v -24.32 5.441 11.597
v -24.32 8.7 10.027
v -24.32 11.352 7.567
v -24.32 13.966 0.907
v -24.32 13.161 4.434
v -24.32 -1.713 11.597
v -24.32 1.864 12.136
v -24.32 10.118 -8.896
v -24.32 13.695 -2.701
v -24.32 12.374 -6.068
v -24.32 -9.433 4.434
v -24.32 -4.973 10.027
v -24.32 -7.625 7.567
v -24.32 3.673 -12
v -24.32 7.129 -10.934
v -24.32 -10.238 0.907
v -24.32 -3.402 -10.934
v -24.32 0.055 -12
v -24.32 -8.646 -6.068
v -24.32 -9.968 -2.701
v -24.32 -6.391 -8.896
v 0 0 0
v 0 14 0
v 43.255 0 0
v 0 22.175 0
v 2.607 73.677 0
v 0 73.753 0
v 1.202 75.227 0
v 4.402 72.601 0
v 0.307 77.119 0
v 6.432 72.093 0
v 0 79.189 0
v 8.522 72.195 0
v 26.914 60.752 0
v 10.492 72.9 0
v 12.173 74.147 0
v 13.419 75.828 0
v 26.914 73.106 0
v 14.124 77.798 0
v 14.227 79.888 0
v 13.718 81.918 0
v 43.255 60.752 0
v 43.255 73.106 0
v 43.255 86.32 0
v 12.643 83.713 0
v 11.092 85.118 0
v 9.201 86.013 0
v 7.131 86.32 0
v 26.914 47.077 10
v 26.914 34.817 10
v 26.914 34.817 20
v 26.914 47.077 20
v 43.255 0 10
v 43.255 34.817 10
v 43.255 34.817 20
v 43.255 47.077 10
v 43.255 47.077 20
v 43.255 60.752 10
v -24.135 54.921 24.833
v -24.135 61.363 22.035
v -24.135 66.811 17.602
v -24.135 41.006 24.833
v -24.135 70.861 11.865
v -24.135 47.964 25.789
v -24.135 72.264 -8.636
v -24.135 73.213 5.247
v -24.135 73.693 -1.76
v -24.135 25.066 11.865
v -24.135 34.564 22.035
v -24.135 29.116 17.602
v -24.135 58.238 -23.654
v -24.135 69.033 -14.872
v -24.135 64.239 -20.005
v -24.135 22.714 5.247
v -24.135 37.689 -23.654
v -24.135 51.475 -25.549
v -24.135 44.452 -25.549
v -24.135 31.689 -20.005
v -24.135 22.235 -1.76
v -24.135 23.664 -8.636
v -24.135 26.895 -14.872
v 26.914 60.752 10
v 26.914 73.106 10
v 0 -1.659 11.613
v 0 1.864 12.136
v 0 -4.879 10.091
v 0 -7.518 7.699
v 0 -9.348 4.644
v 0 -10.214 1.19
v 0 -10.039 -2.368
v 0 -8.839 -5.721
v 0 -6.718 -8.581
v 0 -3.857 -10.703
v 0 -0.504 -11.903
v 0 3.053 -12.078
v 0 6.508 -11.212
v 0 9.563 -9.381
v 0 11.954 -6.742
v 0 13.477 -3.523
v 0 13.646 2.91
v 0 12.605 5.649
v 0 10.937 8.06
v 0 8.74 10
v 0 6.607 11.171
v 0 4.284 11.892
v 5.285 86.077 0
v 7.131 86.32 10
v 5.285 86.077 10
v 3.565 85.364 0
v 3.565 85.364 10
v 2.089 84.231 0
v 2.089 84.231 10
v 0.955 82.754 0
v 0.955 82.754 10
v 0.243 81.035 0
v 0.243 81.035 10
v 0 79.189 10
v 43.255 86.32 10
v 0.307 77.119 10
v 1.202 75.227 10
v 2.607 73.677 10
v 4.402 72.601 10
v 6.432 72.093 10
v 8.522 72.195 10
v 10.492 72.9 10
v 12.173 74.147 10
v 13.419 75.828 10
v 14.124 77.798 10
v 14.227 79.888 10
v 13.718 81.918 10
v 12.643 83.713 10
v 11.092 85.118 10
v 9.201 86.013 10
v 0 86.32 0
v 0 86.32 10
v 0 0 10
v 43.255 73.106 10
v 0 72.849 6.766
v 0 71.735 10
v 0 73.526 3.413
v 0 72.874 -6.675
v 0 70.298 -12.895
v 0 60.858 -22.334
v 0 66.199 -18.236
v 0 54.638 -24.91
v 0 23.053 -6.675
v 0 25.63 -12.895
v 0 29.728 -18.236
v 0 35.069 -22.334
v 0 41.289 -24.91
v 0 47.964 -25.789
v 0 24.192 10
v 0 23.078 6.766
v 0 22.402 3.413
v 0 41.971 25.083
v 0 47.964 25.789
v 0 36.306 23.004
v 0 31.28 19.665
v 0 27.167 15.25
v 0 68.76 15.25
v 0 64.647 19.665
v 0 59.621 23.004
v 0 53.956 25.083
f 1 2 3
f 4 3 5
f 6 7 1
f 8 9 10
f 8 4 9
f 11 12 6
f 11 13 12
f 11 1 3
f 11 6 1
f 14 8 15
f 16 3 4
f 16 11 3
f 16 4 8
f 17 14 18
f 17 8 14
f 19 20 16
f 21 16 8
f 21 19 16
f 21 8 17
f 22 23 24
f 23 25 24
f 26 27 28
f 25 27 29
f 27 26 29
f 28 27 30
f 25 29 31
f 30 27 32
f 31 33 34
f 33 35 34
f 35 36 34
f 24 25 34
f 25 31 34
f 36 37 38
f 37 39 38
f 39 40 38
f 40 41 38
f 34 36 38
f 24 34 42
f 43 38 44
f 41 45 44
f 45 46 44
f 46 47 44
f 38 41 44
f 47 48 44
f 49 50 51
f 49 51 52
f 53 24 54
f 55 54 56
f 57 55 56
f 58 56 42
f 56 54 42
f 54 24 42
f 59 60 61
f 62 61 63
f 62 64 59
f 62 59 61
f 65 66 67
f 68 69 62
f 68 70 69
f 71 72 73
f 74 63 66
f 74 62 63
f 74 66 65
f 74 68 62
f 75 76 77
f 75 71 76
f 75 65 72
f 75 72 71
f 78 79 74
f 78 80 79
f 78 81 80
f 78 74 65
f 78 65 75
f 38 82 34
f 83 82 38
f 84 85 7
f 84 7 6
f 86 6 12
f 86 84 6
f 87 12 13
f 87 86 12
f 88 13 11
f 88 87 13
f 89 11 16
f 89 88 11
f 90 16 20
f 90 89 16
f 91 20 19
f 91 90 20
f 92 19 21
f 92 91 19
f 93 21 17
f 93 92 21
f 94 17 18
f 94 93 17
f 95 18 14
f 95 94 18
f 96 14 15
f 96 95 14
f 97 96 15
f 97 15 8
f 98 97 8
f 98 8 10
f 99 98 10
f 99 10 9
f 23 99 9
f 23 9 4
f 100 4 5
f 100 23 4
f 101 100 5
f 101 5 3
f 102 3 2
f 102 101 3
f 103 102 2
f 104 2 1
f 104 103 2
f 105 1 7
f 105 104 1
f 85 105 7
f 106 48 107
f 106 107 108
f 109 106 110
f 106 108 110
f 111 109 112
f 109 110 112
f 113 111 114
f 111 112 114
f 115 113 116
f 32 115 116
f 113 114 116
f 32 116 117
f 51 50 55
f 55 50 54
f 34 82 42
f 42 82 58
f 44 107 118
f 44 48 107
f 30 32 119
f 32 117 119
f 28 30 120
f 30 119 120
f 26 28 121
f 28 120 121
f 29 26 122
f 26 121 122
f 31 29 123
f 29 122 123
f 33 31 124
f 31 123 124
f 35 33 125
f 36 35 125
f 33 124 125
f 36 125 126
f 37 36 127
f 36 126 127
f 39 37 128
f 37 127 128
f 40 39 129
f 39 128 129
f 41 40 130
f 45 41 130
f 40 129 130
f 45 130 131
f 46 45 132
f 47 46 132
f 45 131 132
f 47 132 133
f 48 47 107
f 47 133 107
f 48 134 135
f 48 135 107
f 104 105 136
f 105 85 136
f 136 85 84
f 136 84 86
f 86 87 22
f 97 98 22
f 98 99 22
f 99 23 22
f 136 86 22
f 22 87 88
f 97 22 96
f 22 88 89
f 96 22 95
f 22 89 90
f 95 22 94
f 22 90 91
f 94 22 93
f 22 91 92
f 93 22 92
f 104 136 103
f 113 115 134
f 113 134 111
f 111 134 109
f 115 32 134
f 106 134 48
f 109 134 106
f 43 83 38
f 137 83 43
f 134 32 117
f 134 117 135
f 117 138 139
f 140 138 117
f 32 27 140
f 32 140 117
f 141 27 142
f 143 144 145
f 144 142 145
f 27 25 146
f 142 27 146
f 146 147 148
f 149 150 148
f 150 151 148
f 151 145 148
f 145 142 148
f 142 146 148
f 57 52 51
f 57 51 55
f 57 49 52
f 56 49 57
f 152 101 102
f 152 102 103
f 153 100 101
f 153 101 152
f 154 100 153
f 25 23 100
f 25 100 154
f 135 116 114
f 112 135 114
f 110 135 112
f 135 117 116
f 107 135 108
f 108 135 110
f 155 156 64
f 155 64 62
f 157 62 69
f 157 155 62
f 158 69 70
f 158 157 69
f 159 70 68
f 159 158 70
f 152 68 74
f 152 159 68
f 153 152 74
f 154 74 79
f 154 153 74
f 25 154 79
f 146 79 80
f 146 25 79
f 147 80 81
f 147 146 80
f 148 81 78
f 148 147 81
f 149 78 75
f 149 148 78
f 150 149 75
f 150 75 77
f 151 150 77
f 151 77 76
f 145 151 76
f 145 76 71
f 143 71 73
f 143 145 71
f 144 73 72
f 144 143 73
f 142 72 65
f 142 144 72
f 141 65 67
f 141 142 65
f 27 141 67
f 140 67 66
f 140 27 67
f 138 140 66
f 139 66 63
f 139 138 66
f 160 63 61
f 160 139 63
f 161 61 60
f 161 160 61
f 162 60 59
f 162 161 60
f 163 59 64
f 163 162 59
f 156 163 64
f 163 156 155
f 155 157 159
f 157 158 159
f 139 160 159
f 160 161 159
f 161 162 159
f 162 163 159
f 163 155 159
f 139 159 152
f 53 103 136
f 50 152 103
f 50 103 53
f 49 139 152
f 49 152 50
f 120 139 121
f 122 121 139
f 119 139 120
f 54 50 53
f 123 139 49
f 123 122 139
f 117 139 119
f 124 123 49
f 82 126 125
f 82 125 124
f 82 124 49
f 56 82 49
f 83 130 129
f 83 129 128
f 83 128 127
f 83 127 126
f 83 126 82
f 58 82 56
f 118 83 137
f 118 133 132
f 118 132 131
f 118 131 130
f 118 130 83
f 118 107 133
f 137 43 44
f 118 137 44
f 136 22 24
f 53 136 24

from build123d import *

# Parameters (mm, degrees)
SKETCH_1_W          = 43.254699728
SKETCH_1_H          = 86.319685861
EXTRUDE_1_DEPTH     = 10
SKETCH_2_W          = 24.135491712
SKETCH_2_H          = 25.789004645
SKETCH_3_W          = 24.320068761
SKETCH_3_H          = 12.136002186
SKETCH_4_W          = 16.340574455
SKETCH_4_H          = 12.354227472
CUT_EXTRUDE_1_DEPTH = 10
SKETCH_4_3_W        = 16.340574455
SKETCH_4_3_H        = 12.259920393
EXTRUDE_2_DEPTH     = 10
SKETCH_8_R          = 7.130638078
CUT_EXTRUDE_3_DEPTH = 10


with BuildPart() as part:
    # 草图1 → 凸台-拉伸1 (new body)
    with BuildSketch(Plane.XY):
        with Locations((21.627349864, 43.159842931)):
            Rectangle(SKETCH_1_W, SKETCH_1_H)
    extrude(amount=EXTRUDE_1_DEPTH)

    # 草图2 → 旋转3 (revolve)
    with BuildSketch(Plane.XY):
        with Locations((-12.067745856, 60.858179452)):
            Rectangle(SKETCH_2_W, SKETCH_2_H)
    revolve(axis=Axis((-24.135491712, 47.963677129, 0), (1, 0, 0)))

    # 草图3 → 旋转5 (revolve)
    with BuildSketch(Plane.XY):
        with Locations((-12.160034381, 7.931725474)):
            Rectangle(SKETCH_3_W, SKETCH_3_H)
    revolve(axis=Axis((-24.320068761, 1.863724381, 0), (1, 0, 0)))

    # 草图4 → 切除-拉伸1 (cut)
    with BuildSketch(Plane.XY.offset(10)):
        with Locations((35.084412501, 66.928824031)):
            Rectangle(SKETCH_4_W, SKETCH_4_H)
    extrude(amount=-CUT_EXTRUDE_1_DEPTH, mode=Mode.SUBTRACT)

    # 草图4<3> → 凸台-拉伸2 (add)
    with BuildSketch(Plane.XY.offset(10)):
        with Locations((35.084412501, 40.947223507)):
            Rectangle(SKETCH_4_3_W, SKETCH_4_3_H)
    extrude(amount=EXTRUDE_2_DEPTH)

    # 草图8 → 切除-拉伸3 (cut)
    with BuildSketch(Plane.XY.offset(10)):
        with Locations((7.130638078, 79.189047783)):
            Circle(SKETCH_8_R)
    extrude(amount=-CUT_EXTRUDE_3_DEPTH, mode=Mode.SUBTRACT)


with BuildPart() as cut_extrude_3_piece_1:
    # of the separate pieces the step leaves, piece 1, a body of its own (cut_extrude_3_pieces)
    add(part.part.solids().sort_by_distance((0, 0, 0))[0])


with BuildPart() as cut_extrude_3_piece_2:
    # of the separate pieces the step leaves, piece 2, a body of its own (cut_extrude_3_pieces)
    add(part.part.solids().sort_by_distance((0, 86.319685861, 0))[0])


solid = Compound([cut_extrude_3_piece_1.part, cut_extrude_3_piece_2.part])
